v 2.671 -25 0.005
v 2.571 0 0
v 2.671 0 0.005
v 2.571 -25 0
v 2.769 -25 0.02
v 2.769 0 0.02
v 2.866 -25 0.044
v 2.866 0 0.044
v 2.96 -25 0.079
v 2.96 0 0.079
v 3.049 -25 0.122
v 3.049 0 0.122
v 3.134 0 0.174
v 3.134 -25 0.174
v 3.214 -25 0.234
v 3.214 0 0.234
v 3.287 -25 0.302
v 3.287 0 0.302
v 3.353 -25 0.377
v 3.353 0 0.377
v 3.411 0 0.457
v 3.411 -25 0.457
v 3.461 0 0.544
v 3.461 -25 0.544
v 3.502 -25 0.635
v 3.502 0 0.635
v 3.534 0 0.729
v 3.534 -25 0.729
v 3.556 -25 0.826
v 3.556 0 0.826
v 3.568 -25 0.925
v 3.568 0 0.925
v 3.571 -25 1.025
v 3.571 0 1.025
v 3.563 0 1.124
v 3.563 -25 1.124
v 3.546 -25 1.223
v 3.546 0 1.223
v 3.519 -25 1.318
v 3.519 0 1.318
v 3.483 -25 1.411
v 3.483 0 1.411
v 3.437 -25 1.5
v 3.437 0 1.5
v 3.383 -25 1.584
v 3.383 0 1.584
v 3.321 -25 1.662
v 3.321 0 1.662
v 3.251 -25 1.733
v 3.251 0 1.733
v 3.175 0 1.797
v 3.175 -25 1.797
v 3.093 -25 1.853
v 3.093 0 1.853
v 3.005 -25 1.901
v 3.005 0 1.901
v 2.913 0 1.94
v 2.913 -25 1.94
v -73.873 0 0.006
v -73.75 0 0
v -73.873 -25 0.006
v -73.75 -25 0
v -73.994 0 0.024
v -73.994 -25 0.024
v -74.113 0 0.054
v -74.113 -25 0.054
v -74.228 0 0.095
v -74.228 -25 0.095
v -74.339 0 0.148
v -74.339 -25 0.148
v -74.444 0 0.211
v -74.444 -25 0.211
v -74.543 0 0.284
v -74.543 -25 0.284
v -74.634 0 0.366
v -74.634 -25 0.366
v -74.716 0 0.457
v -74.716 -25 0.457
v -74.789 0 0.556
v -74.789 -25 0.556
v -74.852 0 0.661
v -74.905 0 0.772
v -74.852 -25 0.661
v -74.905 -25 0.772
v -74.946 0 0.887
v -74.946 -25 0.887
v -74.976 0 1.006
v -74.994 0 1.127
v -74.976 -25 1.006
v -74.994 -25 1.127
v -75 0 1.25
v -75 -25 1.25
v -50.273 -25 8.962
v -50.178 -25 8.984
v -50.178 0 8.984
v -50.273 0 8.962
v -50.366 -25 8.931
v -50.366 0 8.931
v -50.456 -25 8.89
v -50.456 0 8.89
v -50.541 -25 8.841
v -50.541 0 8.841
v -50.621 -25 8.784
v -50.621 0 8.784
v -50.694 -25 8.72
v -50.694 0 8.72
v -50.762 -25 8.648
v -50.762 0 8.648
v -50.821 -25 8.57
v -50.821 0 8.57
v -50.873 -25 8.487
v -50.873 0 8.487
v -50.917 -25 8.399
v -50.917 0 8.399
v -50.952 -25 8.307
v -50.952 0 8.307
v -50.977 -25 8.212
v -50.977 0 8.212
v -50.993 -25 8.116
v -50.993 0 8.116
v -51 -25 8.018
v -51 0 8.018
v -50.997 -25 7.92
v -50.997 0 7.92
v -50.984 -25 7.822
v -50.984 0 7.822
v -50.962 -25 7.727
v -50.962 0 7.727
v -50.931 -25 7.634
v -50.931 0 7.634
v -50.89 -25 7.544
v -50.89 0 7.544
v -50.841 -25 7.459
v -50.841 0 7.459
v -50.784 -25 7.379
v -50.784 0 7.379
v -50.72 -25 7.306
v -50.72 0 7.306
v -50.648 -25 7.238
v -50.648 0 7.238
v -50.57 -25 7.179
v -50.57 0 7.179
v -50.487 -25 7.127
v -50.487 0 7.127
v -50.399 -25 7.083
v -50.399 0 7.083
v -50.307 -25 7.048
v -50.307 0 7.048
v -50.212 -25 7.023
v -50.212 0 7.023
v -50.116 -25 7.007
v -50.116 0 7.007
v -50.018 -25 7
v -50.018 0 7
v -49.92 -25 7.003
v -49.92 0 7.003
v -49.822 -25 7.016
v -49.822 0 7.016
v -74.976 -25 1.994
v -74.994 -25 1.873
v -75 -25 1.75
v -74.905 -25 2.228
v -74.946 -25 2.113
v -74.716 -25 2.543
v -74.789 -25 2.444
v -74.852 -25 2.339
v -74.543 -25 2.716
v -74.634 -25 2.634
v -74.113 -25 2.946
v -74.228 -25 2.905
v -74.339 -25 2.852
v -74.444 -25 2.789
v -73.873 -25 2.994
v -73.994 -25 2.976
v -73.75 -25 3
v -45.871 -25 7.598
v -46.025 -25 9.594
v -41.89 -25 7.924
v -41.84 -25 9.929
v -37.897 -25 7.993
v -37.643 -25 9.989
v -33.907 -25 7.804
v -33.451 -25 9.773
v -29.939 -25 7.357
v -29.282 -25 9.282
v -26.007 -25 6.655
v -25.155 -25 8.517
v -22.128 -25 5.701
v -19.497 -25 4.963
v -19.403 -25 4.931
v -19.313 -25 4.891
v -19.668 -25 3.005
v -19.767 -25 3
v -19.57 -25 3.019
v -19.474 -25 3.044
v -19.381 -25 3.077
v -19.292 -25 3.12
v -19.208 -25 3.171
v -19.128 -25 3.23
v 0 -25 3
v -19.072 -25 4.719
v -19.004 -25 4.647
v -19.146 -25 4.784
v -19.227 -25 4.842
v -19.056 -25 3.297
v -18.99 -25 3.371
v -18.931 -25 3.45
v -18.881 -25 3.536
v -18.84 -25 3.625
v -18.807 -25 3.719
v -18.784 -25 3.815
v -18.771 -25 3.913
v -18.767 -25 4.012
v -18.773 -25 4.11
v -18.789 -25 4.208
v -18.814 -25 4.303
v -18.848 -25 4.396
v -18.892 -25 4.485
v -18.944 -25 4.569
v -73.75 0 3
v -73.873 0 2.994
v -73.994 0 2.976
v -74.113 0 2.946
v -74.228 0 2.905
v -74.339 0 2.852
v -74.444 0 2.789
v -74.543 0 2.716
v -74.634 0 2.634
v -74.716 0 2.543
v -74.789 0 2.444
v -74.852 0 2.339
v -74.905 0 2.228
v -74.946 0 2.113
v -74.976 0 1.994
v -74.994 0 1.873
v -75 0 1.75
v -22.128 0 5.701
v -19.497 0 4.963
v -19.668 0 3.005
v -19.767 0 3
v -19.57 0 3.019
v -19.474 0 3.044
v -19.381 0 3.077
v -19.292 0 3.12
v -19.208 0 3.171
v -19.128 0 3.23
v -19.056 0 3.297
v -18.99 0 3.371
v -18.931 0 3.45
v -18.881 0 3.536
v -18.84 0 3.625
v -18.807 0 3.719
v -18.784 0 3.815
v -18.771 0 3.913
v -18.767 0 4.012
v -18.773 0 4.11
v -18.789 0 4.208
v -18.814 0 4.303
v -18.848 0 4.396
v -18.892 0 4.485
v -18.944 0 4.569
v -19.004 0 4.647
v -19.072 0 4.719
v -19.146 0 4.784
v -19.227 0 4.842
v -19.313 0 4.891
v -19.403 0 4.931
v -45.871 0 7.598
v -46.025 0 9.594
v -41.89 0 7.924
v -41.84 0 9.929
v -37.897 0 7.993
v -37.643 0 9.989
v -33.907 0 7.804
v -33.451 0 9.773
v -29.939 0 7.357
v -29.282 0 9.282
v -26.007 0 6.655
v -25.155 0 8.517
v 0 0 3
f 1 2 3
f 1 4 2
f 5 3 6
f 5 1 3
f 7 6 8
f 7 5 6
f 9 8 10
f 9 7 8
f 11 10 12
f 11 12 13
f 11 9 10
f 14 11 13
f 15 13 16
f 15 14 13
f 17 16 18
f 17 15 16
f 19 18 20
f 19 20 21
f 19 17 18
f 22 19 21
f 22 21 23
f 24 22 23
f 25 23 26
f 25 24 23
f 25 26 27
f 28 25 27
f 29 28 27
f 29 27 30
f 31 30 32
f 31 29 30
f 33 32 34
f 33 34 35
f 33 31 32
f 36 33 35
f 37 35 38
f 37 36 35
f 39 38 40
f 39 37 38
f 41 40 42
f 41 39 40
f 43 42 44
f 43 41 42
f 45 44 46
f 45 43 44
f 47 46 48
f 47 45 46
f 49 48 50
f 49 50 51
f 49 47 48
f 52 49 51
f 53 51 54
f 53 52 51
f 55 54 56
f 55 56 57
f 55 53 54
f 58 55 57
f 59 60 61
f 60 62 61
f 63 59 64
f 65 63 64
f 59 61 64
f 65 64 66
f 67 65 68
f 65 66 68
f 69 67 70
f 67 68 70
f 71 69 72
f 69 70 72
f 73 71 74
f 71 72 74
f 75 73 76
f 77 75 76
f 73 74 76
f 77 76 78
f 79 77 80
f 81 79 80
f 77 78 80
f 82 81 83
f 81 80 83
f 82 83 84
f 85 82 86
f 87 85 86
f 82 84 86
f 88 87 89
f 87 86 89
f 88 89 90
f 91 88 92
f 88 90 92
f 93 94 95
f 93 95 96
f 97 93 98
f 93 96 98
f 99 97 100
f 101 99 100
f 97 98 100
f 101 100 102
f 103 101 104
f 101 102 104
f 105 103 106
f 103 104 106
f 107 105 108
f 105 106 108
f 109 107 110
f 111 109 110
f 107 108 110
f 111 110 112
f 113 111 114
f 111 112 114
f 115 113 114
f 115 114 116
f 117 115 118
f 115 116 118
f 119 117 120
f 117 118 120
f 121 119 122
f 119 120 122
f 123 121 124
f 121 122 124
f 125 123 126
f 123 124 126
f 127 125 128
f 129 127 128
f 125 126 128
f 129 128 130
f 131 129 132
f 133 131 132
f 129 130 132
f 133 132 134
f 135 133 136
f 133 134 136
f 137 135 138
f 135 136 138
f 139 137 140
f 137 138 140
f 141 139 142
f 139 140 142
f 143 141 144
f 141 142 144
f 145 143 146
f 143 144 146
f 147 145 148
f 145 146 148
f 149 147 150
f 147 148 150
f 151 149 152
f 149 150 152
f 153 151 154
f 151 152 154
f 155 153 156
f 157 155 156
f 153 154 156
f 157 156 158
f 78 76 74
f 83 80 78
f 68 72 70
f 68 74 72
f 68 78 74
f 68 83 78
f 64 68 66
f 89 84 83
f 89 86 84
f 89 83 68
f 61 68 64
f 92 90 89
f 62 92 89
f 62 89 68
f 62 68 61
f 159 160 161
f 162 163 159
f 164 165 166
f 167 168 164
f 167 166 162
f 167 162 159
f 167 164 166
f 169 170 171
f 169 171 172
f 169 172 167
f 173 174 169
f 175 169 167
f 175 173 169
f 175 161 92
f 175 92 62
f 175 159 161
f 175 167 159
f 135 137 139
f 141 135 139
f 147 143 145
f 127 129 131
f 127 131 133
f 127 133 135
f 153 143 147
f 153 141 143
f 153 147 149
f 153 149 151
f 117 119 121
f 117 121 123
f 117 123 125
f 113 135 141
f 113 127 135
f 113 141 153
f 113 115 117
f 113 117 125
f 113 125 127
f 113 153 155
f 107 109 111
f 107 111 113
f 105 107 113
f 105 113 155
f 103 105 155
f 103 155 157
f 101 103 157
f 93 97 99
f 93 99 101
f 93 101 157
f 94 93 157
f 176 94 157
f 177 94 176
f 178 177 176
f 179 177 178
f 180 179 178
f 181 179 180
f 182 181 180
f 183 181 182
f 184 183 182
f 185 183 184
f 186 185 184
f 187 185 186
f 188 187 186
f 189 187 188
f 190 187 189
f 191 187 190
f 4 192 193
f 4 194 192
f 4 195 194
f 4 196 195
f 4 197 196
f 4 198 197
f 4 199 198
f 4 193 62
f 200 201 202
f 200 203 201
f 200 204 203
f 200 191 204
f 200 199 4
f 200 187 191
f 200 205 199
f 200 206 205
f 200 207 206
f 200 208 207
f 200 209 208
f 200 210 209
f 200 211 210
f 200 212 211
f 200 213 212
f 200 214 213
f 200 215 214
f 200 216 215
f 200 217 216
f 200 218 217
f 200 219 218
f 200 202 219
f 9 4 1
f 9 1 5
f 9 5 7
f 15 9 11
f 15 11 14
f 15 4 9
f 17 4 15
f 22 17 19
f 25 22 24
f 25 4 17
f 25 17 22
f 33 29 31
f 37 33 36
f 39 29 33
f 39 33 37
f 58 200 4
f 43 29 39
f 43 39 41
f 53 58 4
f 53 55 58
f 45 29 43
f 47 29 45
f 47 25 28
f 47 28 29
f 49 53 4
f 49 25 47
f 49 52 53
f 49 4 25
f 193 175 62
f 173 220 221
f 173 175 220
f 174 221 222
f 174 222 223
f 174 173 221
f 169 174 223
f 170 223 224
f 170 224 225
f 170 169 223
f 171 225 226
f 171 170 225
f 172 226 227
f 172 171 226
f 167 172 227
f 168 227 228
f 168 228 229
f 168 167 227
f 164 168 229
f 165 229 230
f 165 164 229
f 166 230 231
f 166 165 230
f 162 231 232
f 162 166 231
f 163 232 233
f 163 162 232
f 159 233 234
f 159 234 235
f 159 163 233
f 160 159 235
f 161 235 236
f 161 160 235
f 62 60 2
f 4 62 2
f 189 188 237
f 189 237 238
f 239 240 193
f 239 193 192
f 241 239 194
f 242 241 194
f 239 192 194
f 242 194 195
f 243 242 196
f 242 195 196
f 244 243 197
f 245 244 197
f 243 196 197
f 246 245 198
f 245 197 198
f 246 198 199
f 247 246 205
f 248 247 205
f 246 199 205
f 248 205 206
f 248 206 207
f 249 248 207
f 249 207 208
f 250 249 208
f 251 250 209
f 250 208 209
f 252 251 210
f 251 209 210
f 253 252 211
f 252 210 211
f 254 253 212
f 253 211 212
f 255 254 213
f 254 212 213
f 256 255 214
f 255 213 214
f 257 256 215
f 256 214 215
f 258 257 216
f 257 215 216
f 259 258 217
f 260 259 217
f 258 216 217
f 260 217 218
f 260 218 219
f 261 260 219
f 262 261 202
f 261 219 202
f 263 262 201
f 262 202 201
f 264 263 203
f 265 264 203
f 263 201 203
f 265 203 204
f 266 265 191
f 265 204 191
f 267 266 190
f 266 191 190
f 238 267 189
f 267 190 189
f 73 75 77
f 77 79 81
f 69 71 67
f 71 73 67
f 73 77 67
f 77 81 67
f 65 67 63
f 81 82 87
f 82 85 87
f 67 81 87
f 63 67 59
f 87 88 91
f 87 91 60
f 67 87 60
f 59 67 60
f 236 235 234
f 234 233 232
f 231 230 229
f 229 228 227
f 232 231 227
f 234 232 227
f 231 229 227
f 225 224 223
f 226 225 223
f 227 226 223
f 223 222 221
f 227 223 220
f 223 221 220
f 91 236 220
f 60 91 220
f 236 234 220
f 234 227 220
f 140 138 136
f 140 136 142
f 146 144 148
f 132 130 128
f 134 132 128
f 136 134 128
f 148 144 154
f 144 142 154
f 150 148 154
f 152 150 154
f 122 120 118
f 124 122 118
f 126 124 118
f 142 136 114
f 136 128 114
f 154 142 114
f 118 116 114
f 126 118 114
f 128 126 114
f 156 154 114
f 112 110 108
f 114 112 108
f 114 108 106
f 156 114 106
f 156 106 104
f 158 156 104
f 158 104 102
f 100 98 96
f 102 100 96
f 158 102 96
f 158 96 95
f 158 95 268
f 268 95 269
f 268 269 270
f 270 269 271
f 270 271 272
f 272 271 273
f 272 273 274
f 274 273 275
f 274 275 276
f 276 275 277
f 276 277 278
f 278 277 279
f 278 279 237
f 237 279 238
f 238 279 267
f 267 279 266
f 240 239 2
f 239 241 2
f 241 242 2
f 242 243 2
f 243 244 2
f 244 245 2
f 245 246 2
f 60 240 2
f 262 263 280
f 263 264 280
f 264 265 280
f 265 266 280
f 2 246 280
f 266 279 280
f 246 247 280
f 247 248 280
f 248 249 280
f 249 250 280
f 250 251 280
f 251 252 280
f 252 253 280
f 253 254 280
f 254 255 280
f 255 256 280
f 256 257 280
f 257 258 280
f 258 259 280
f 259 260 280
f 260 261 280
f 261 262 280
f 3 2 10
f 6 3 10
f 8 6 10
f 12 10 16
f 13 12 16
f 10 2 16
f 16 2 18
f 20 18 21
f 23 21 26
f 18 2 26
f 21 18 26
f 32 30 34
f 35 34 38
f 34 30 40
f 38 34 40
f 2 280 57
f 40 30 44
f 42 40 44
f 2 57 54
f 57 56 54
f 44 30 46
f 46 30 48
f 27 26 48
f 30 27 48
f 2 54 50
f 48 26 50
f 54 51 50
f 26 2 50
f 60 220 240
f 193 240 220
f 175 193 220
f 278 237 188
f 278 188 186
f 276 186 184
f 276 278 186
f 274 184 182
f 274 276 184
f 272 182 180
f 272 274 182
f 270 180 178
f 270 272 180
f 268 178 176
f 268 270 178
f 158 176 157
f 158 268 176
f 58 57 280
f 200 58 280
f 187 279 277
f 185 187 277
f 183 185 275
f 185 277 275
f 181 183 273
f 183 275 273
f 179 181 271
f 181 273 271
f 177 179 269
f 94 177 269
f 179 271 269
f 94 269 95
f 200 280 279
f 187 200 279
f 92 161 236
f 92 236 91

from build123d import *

# Parameters (mm, degrees)
PAD_DEPTH   = 25
FILLET_R    = 1.25
FILLET001_R = 1


with BuildPart() as part:
    # Sketch → Pad (new body)
    with BuildSketch(Plane.XZ):
        with BuildLine():
            Line((-75, 0), (0, 0))
            Line((0, 0), (8.242432, 0))
            Line((8.242432, 0), (0, 3))
            Line((0, 3), (-25.154795, 8.517473))
            ThreePointArc((-25.154795, 8.517473), (-37.643151, 9.988902), (-50.177682, 8.984088))
            ThreePointArc((-50.177682, 8.984088), (-50.984088, 7.822318), (-49.822318, 7.015912))
            ThreePointArc((-22.128287, 5.701128), (-35.900676, 7.930421), (-49.822318, 7.015912))
            Line((-22.128287, 5.701128), (-12.5, 3))
            Line((-12.5, 3), (-75, 3))
            Line((-75, 3), (-75, 0))
        make_face()
    extrude(amount=PAD_DEPTH)

    # Fillet
    fillet_edges = [part.edges().sort_by_distance(p)[0] for p in [
        (-75, -12.5, 3),
        (-75, -12.5, 0),
    ]]
    fillet(fillet_edges, radius=FILLET_R)

    # Fillet001
    fillet001_edges = [part.edges().sort_by_distance(p)[0] for p in [
        (-12.5, -12.5, 3),
        (8.242432, -12.5, 0),
    ]]
    fillet(fillet001_edges, radius=FILLET001_R)


solid = part.part
